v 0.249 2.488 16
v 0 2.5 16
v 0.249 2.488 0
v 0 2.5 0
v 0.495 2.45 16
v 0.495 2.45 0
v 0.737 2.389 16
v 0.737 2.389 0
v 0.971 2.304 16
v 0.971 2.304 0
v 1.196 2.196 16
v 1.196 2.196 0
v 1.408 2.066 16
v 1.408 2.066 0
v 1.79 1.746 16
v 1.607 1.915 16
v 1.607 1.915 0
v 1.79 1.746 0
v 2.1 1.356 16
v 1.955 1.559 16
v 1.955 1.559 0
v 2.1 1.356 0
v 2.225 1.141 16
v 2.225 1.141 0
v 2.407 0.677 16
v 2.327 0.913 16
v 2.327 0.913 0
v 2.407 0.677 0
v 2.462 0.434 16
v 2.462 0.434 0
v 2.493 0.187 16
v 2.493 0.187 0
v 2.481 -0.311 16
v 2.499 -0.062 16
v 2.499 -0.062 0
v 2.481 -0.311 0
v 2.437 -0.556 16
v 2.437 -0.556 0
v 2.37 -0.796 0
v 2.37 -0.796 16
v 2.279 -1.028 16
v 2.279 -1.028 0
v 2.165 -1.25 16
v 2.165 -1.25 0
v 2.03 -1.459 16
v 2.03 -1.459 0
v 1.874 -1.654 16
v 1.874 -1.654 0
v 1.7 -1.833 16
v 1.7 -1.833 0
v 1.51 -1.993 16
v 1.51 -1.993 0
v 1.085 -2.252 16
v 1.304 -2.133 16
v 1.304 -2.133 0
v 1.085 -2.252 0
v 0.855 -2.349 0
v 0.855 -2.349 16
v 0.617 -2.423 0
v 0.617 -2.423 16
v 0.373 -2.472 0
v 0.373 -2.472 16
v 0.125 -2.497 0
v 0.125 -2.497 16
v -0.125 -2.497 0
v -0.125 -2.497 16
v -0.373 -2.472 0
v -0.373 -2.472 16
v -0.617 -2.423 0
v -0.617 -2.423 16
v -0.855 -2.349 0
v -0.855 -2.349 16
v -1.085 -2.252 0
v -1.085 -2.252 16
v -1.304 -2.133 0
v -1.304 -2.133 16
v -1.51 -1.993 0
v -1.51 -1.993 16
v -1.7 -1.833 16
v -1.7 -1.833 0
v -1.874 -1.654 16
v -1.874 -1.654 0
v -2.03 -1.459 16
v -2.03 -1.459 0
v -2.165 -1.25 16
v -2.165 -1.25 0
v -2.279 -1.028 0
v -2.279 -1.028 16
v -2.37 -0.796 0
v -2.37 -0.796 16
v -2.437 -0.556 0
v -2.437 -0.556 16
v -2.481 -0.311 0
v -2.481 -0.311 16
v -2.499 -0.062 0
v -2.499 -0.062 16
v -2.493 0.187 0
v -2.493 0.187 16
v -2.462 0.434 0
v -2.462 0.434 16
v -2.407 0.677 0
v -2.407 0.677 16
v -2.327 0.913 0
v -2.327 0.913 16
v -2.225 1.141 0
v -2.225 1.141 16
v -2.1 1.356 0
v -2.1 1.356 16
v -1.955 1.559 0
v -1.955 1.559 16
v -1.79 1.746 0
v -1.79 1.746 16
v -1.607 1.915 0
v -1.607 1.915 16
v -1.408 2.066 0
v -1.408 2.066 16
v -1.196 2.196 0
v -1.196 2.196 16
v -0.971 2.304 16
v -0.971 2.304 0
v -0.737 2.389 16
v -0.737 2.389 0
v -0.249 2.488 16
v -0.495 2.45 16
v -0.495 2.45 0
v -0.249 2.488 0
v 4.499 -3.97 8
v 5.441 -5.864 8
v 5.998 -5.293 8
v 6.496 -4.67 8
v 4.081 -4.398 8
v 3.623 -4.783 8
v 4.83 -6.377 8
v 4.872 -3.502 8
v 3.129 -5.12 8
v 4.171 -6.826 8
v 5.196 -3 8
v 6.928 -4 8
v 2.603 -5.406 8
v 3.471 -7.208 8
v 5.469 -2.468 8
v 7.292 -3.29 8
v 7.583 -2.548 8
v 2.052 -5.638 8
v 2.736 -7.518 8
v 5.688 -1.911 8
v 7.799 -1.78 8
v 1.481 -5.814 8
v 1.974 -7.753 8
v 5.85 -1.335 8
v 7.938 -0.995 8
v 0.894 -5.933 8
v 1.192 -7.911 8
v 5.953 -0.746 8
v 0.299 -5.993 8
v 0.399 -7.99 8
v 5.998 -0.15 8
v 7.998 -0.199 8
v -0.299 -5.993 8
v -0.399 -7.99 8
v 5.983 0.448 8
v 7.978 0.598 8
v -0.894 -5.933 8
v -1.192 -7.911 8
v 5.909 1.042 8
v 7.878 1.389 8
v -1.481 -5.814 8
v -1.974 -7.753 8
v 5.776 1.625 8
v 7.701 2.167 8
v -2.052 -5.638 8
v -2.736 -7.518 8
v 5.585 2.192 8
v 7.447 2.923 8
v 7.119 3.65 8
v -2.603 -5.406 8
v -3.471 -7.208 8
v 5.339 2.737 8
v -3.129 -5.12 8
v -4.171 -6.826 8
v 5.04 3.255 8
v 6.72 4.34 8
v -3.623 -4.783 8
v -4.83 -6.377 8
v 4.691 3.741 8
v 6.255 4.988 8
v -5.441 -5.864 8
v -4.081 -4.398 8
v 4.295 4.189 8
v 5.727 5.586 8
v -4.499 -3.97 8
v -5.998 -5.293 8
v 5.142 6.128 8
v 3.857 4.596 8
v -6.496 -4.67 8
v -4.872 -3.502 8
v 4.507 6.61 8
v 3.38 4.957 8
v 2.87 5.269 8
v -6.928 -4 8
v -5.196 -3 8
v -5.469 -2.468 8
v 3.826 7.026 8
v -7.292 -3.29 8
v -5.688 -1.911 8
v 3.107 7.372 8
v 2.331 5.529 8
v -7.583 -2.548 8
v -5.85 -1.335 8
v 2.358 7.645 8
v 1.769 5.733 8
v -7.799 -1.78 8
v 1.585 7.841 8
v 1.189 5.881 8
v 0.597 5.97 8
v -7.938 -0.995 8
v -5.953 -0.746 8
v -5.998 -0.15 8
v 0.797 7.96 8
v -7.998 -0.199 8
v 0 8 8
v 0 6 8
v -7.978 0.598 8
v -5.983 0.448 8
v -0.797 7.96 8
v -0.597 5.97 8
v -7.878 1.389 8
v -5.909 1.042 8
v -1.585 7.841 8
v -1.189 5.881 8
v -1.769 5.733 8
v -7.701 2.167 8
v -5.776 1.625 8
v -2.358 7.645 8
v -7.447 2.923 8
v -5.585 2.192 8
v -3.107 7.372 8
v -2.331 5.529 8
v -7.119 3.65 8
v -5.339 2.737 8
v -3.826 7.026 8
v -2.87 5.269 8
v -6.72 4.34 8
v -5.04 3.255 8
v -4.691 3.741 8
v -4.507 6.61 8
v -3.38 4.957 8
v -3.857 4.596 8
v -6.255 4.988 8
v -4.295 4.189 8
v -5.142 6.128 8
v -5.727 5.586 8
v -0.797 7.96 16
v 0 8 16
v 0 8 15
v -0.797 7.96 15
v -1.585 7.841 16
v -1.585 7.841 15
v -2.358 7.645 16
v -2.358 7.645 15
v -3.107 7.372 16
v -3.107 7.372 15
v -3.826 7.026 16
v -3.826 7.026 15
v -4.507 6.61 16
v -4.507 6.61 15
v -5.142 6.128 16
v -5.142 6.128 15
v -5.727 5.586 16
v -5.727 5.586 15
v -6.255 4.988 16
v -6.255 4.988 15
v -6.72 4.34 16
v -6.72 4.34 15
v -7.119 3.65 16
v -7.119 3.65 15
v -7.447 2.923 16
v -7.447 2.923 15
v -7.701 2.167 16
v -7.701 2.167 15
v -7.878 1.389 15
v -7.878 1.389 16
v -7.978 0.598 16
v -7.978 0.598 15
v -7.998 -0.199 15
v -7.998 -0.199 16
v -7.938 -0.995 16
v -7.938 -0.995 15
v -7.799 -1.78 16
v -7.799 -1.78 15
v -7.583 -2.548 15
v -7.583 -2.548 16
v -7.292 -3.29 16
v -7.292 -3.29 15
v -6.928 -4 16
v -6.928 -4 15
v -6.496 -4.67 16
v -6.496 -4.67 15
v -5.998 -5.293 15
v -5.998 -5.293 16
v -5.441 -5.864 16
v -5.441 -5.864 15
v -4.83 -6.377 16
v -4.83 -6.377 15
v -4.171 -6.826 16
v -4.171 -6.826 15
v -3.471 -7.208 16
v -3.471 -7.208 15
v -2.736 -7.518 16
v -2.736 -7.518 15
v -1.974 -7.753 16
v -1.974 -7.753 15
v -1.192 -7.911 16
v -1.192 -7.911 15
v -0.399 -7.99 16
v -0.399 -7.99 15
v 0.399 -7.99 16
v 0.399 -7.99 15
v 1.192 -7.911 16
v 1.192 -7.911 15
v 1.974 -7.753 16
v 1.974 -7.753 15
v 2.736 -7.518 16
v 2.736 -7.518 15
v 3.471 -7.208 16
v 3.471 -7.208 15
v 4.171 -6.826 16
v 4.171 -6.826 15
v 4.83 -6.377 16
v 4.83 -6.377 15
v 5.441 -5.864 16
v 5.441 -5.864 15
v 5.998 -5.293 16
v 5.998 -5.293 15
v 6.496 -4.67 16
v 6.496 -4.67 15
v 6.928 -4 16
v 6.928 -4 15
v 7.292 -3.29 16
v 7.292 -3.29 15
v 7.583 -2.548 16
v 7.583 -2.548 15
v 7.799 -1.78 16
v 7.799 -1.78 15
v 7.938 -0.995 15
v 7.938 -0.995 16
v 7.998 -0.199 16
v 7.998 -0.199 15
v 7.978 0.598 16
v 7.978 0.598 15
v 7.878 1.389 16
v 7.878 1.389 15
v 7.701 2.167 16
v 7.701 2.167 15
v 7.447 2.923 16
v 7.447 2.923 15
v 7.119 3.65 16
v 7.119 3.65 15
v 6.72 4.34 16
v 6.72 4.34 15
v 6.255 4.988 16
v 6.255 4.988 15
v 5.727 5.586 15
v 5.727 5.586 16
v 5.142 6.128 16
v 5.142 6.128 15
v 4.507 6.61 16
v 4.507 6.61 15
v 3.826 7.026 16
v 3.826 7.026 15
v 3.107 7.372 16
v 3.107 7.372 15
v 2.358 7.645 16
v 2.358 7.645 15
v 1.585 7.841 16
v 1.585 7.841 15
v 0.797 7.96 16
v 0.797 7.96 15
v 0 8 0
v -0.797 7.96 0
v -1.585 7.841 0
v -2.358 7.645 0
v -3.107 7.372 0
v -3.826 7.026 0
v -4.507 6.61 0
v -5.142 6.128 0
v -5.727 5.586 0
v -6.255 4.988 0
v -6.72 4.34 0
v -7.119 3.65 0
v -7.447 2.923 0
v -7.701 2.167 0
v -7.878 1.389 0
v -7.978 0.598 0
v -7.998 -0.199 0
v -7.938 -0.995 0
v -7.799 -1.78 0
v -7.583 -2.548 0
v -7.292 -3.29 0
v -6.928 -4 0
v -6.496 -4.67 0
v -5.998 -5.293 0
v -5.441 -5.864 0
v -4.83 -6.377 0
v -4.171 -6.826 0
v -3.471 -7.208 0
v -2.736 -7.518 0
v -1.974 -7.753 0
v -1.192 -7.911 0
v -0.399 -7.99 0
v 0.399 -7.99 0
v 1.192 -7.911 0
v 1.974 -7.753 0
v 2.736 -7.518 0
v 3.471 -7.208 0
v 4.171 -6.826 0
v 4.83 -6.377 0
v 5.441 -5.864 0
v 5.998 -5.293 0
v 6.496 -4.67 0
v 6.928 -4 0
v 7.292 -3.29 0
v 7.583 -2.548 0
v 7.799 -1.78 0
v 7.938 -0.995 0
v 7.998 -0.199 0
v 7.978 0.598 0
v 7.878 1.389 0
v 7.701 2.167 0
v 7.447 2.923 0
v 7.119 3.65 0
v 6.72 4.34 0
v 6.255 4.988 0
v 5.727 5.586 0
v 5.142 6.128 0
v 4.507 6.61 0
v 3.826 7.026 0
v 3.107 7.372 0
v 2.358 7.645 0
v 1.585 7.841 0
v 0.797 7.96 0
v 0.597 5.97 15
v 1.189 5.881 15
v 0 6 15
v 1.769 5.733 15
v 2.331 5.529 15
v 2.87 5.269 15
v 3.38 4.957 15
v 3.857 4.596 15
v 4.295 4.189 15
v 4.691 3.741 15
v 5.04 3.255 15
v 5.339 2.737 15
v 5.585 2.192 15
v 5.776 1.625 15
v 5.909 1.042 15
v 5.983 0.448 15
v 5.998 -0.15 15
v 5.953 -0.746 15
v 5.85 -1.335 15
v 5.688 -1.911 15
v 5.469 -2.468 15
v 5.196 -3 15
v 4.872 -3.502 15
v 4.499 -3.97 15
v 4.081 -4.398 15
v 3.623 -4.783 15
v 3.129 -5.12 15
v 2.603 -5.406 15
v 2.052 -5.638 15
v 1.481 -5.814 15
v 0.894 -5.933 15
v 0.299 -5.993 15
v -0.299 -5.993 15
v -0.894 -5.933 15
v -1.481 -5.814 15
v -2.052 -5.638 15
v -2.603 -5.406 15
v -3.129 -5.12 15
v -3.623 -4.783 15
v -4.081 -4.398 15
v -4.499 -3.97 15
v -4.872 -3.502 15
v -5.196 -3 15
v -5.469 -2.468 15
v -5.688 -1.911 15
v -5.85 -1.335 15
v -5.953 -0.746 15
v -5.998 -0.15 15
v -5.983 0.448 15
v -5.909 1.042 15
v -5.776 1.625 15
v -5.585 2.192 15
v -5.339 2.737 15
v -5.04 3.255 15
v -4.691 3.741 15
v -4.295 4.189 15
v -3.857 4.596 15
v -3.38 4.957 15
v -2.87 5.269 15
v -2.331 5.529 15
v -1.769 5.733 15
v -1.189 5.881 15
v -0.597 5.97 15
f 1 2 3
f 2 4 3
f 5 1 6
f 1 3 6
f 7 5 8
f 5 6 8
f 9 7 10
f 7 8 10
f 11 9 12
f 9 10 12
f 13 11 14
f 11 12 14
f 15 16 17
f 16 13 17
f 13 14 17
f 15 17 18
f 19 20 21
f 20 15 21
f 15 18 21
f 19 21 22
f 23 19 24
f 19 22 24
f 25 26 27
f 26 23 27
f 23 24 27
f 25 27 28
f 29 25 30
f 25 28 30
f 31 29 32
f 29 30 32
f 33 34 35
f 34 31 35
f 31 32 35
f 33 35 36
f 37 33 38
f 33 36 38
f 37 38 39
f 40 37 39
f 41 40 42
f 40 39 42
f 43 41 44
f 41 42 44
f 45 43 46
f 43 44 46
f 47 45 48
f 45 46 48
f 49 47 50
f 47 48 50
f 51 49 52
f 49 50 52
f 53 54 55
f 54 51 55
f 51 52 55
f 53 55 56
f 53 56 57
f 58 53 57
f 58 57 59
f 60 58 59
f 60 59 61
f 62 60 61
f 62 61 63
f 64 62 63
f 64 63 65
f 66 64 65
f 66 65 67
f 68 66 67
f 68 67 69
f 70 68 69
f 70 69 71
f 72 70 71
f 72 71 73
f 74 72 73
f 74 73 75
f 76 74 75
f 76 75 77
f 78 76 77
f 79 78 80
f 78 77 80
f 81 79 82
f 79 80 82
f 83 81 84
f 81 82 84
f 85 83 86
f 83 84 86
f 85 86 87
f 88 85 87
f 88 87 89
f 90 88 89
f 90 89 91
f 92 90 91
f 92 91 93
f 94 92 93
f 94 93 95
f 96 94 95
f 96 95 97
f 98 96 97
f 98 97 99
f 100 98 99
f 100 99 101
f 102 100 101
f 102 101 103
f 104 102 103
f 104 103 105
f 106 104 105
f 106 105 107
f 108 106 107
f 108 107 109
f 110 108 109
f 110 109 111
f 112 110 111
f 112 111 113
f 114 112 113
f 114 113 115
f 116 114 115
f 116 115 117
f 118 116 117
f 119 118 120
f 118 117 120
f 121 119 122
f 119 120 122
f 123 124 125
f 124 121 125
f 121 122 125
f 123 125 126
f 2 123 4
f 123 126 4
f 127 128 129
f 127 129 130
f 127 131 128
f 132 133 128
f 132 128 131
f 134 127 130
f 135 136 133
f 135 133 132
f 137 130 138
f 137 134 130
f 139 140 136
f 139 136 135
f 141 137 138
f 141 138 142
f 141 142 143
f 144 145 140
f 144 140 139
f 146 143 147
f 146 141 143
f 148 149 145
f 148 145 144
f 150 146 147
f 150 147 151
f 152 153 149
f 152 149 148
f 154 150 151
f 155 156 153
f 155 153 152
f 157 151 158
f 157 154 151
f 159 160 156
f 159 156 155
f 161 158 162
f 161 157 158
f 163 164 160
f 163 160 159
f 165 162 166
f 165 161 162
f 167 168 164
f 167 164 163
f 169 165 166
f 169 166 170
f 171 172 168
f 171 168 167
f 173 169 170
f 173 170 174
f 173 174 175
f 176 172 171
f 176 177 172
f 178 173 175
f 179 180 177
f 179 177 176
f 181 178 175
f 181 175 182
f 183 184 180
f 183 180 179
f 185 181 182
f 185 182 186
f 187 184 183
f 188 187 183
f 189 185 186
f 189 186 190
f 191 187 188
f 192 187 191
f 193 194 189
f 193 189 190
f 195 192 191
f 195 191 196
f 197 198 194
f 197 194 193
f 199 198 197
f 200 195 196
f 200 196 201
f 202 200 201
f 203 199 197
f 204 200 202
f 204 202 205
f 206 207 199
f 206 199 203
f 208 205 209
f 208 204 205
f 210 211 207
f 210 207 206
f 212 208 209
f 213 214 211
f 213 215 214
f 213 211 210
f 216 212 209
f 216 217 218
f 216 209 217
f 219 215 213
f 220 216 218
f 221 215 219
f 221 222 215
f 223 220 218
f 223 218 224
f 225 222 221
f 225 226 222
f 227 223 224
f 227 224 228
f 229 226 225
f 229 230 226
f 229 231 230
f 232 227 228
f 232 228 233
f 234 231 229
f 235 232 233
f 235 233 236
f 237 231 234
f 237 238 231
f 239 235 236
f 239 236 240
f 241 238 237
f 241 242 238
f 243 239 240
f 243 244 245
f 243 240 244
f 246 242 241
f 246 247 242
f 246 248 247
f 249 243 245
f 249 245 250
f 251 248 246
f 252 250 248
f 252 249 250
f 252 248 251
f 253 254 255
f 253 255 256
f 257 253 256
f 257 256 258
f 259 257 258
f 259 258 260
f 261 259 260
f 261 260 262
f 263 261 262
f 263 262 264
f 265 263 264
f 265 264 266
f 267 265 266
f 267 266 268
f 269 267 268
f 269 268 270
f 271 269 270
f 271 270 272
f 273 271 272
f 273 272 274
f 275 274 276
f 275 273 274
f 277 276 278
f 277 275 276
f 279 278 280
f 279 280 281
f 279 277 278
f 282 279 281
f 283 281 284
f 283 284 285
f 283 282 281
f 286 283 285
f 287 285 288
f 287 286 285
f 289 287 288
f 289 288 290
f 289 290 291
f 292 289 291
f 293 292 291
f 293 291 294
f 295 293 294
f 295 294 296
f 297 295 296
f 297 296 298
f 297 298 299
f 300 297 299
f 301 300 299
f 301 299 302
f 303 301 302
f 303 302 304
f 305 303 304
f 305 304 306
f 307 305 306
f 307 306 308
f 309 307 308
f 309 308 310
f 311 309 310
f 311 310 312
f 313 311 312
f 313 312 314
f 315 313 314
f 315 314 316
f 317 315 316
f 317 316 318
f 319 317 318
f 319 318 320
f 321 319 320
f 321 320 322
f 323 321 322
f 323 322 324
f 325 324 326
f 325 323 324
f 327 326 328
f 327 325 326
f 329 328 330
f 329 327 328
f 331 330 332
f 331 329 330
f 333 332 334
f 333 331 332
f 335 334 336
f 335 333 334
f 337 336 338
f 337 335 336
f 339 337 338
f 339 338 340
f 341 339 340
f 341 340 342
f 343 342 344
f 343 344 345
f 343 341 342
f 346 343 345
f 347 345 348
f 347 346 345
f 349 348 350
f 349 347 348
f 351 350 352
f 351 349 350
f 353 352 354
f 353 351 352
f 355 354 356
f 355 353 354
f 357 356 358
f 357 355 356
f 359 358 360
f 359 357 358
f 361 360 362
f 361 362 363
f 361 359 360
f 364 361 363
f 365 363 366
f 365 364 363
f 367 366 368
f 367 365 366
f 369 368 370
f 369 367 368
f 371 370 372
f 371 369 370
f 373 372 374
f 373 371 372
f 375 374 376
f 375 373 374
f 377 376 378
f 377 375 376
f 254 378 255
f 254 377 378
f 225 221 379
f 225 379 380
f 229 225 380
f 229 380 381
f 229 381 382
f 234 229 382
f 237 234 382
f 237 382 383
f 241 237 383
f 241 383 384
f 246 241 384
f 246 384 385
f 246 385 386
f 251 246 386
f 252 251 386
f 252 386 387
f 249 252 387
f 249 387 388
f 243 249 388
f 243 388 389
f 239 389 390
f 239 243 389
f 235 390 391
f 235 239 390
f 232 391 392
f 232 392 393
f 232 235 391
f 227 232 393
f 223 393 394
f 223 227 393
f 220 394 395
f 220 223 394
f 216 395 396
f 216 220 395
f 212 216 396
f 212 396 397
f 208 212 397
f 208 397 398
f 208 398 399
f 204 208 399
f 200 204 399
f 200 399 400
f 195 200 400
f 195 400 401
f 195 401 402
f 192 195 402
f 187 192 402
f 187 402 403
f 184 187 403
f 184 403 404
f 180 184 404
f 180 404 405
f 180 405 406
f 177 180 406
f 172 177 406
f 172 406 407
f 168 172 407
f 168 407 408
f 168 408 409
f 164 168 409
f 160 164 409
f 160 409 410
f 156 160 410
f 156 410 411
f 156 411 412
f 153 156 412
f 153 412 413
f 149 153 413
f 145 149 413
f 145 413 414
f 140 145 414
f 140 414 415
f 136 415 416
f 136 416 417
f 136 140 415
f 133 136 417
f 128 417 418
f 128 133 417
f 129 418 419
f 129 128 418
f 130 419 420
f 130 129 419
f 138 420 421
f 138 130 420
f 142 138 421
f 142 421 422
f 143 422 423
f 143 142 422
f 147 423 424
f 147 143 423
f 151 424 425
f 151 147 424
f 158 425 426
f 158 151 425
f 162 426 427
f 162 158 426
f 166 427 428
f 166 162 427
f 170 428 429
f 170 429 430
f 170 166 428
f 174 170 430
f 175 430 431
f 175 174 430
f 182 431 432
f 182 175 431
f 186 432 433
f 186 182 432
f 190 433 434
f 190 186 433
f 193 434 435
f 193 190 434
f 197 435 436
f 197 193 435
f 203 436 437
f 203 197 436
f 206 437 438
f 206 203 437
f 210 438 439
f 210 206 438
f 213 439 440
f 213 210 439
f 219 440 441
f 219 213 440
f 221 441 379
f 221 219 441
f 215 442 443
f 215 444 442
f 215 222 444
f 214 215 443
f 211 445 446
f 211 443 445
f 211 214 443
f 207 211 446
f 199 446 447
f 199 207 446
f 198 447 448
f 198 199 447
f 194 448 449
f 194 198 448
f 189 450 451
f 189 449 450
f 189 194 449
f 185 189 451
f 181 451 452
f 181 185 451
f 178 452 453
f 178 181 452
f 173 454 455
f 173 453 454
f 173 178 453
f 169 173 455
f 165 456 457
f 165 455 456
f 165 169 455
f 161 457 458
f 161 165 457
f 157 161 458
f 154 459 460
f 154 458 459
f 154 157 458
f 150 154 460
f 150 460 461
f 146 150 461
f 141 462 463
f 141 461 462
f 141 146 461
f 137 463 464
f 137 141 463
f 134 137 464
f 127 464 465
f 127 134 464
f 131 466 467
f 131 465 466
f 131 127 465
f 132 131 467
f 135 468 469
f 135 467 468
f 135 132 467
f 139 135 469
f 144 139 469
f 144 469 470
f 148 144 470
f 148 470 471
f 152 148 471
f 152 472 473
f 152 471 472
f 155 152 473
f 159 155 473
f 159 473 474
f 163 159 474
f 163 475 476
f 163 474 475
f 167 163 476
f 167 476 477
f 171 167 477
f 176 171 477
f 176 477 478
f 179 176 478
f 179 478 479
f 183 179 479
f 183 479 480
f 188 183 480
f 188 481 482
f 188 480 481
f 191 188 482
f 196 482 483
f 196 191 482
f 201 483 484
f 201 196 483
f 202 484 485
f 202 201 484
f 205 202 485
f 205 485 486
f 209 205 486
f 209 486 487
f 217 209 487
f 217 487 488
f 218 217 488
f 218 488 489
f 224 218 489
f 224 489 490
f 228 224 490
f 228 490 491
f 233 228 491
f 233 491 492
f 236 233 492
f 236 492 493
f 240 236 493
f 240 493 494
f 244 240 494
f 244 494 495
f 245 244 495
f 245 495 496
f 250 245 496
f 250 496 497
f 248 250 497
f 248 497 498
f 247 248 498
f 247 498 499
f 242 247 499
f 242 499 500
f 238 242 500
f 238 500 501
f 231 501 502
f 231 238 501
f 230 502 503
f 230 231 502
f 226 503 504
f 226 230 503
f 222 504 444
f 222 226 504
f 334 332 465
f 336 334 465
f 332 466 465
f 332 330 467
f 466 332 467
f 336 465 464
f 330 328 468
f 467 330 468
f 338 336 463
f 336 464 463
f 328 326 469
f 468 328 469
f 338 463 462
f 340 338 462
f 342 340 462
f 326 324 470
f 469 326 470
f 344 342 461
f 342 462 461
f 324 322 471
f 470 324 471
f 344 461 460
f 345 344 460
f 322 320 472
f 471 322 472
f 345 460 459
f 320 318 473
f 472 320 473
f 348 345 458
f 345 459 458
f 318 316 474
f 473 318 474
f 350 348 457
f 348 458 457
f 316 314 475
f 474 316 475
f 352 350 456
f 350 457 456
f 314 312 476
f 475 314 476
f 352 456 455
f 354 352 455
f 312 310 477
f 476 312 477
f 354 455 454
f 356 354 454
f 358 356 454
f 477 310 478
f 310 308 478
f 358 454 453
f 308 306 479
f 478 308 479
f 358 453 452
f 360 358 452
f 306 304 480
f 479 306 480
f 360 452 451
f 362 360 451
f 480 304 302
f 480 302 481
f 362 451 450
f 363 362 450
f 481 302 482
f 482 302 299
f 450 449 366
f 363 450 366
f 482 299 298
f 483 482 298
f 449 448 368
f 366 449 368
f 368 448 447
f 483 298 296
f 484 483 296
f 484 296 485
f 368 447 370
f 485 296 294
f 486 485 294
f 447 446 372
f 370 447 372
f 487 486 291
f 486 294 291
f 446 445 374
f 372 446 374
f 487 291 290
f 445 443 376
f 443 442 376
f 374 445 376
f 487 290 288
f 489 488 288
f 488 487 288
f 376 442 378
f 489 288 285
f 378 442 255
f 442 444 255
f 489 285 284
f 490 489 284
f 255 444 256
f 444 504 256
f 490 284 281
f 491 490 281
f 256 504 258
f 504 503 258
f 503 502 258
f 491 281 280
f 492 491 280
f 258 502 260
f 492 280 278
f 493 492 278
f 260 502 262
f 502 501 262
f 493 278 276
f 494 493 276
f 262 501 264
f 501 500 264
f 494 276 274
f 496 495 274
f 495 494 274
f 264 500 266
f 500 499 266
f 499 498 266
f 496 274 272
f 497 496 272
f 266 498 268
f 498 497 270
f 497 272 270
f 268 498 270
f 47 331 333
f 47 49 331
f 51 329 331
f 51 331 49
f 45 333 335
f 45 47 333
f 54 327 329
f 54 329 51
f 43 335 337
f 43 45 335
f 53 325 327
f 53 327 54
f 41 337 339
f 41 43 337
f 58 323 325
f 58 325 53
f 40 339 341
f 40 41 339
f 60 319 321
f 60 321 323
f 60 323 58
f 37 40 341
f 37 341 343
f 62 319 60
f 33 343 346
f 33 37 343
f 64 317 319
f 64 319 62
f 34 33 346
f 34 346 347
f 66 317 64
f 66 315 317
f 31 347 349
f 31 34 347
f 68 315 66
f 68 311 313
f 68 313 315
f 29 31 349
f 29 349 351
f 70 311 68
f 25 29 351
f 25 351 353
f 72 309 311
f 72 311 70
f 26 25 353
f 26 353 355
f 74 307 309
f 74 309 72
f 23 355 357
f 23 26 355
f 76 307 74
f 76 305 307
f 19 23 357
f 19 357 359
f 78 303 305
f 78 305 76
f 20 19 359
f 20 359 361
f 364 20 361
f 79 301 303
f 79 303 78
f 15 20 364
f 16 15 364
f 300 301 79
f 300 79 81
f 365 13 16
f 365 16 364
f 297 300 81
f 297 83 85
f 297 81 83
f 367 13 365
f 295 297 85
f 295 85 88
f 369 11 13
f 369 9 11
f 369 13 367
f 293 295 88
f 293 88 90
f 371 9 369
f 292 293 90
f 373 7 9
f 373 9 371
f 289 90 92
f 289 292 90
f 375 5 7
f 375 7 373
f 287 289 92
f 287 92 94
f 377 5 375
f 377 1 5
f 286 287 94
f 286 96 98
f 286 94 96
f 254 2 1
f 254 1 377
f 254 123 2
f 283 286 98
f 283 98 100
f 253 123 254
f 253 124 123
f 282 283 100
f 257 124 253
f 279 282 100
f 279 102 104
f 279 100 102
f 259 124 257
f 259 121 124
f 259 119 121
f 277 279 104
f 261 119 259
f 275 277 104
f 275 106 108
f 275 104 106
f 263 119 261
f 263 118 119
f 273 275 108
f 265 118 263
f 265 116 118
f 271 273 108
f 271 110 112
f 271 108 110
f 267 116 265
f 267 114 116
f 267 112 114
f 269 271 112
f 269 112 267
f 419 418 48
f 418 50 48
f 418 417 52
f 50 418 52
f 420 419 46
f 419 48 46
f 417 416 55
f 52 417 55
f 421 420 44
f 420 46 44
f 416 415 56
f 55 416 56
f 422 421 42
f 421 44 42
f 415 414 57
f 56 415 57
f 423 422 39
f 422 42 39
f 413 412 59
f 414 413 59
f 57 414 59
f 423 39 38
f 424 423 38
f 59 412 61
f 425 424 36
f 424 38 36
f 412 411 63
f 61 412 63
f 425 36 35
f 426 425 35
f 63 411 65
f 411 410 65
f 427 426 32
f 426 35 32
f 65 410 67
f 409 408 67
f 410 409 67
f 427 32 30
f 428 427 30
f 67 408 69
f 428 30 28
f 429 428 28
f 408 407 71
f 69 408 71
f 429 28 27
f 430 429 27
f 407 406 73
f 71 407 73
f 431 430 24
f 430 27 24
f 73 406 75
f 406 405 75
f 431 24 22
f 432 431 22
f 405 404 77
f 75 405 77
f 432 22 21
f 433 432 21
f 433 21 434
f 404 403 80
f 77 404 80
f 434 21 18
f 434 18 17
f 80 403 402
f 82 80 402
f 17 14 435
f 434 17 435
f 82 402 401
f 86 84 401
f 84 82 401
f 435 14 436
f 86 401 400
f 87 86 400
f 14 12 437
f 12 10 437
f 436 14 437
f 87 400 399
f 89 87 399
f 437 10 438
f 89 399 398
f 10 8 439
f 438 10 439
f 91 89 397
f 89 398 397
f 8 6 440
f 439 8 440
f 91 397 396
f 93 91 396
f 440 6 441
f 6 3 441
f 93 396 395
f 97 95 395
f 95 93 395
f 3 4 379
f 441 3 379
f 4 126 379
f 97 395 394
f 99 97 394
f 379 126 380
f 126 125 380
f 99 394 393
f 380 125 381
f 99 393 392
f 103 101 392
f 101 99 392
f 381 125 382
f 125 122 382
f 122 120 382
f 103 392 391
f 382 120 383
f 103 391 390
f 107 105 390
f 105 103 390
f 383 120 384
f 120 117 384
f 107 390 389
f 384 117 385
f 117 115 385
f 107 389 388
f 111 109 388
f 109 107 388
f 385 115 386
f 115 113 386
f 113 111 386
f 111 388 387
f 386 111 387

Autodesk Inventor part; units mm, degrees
ref_plane "YZ Plane" through (0, 0, 0) normal (1, 0, 0) x (0, 1, 0)
ref_plane "XZ Plane" through (0, 0, 0) normal (0, 1, 0) x (-1, 0, 0)
ref_plane "XY Plane" through (0, 0, 0) normal (0, 0, 1) x (1, 0, 0)
sketch "Sketch1" plane through (0, 0, 0) normal (1, 0, 0) x (0, 1, 0)
  line L0 (0, 0) -> (8, 0)
  line L1 (8, 0) -> (8, 16)
  line L2 (8, 16) -> (0, 16)
  line L3 (0, 16) -> (0, 0)
  line L4 (8, 15) -> (2.5, 15)
  line L5 (8, 8) -> (2.5, 8)
  line L6 (6, 15) -> (6, 8)
  line L7 (2.5, 16) -> (2.5, 0)
  dimension "d7" = 8
  dimension "d8" = 16
  dimension "d9" = 1
  dimension "d10" = 7
  dimension "d11" = 6
  dimension "d12" = 2.5
revolve "Revolution1" add sketch "Sketch1" angle 360 about axis through (0, 0, 16) along (0, 0, 1) contours L7 L5 L1 L0 | L7 L4 L6 L5 | L2 L1 L4 L7
properties part number "belt_gear_1"
